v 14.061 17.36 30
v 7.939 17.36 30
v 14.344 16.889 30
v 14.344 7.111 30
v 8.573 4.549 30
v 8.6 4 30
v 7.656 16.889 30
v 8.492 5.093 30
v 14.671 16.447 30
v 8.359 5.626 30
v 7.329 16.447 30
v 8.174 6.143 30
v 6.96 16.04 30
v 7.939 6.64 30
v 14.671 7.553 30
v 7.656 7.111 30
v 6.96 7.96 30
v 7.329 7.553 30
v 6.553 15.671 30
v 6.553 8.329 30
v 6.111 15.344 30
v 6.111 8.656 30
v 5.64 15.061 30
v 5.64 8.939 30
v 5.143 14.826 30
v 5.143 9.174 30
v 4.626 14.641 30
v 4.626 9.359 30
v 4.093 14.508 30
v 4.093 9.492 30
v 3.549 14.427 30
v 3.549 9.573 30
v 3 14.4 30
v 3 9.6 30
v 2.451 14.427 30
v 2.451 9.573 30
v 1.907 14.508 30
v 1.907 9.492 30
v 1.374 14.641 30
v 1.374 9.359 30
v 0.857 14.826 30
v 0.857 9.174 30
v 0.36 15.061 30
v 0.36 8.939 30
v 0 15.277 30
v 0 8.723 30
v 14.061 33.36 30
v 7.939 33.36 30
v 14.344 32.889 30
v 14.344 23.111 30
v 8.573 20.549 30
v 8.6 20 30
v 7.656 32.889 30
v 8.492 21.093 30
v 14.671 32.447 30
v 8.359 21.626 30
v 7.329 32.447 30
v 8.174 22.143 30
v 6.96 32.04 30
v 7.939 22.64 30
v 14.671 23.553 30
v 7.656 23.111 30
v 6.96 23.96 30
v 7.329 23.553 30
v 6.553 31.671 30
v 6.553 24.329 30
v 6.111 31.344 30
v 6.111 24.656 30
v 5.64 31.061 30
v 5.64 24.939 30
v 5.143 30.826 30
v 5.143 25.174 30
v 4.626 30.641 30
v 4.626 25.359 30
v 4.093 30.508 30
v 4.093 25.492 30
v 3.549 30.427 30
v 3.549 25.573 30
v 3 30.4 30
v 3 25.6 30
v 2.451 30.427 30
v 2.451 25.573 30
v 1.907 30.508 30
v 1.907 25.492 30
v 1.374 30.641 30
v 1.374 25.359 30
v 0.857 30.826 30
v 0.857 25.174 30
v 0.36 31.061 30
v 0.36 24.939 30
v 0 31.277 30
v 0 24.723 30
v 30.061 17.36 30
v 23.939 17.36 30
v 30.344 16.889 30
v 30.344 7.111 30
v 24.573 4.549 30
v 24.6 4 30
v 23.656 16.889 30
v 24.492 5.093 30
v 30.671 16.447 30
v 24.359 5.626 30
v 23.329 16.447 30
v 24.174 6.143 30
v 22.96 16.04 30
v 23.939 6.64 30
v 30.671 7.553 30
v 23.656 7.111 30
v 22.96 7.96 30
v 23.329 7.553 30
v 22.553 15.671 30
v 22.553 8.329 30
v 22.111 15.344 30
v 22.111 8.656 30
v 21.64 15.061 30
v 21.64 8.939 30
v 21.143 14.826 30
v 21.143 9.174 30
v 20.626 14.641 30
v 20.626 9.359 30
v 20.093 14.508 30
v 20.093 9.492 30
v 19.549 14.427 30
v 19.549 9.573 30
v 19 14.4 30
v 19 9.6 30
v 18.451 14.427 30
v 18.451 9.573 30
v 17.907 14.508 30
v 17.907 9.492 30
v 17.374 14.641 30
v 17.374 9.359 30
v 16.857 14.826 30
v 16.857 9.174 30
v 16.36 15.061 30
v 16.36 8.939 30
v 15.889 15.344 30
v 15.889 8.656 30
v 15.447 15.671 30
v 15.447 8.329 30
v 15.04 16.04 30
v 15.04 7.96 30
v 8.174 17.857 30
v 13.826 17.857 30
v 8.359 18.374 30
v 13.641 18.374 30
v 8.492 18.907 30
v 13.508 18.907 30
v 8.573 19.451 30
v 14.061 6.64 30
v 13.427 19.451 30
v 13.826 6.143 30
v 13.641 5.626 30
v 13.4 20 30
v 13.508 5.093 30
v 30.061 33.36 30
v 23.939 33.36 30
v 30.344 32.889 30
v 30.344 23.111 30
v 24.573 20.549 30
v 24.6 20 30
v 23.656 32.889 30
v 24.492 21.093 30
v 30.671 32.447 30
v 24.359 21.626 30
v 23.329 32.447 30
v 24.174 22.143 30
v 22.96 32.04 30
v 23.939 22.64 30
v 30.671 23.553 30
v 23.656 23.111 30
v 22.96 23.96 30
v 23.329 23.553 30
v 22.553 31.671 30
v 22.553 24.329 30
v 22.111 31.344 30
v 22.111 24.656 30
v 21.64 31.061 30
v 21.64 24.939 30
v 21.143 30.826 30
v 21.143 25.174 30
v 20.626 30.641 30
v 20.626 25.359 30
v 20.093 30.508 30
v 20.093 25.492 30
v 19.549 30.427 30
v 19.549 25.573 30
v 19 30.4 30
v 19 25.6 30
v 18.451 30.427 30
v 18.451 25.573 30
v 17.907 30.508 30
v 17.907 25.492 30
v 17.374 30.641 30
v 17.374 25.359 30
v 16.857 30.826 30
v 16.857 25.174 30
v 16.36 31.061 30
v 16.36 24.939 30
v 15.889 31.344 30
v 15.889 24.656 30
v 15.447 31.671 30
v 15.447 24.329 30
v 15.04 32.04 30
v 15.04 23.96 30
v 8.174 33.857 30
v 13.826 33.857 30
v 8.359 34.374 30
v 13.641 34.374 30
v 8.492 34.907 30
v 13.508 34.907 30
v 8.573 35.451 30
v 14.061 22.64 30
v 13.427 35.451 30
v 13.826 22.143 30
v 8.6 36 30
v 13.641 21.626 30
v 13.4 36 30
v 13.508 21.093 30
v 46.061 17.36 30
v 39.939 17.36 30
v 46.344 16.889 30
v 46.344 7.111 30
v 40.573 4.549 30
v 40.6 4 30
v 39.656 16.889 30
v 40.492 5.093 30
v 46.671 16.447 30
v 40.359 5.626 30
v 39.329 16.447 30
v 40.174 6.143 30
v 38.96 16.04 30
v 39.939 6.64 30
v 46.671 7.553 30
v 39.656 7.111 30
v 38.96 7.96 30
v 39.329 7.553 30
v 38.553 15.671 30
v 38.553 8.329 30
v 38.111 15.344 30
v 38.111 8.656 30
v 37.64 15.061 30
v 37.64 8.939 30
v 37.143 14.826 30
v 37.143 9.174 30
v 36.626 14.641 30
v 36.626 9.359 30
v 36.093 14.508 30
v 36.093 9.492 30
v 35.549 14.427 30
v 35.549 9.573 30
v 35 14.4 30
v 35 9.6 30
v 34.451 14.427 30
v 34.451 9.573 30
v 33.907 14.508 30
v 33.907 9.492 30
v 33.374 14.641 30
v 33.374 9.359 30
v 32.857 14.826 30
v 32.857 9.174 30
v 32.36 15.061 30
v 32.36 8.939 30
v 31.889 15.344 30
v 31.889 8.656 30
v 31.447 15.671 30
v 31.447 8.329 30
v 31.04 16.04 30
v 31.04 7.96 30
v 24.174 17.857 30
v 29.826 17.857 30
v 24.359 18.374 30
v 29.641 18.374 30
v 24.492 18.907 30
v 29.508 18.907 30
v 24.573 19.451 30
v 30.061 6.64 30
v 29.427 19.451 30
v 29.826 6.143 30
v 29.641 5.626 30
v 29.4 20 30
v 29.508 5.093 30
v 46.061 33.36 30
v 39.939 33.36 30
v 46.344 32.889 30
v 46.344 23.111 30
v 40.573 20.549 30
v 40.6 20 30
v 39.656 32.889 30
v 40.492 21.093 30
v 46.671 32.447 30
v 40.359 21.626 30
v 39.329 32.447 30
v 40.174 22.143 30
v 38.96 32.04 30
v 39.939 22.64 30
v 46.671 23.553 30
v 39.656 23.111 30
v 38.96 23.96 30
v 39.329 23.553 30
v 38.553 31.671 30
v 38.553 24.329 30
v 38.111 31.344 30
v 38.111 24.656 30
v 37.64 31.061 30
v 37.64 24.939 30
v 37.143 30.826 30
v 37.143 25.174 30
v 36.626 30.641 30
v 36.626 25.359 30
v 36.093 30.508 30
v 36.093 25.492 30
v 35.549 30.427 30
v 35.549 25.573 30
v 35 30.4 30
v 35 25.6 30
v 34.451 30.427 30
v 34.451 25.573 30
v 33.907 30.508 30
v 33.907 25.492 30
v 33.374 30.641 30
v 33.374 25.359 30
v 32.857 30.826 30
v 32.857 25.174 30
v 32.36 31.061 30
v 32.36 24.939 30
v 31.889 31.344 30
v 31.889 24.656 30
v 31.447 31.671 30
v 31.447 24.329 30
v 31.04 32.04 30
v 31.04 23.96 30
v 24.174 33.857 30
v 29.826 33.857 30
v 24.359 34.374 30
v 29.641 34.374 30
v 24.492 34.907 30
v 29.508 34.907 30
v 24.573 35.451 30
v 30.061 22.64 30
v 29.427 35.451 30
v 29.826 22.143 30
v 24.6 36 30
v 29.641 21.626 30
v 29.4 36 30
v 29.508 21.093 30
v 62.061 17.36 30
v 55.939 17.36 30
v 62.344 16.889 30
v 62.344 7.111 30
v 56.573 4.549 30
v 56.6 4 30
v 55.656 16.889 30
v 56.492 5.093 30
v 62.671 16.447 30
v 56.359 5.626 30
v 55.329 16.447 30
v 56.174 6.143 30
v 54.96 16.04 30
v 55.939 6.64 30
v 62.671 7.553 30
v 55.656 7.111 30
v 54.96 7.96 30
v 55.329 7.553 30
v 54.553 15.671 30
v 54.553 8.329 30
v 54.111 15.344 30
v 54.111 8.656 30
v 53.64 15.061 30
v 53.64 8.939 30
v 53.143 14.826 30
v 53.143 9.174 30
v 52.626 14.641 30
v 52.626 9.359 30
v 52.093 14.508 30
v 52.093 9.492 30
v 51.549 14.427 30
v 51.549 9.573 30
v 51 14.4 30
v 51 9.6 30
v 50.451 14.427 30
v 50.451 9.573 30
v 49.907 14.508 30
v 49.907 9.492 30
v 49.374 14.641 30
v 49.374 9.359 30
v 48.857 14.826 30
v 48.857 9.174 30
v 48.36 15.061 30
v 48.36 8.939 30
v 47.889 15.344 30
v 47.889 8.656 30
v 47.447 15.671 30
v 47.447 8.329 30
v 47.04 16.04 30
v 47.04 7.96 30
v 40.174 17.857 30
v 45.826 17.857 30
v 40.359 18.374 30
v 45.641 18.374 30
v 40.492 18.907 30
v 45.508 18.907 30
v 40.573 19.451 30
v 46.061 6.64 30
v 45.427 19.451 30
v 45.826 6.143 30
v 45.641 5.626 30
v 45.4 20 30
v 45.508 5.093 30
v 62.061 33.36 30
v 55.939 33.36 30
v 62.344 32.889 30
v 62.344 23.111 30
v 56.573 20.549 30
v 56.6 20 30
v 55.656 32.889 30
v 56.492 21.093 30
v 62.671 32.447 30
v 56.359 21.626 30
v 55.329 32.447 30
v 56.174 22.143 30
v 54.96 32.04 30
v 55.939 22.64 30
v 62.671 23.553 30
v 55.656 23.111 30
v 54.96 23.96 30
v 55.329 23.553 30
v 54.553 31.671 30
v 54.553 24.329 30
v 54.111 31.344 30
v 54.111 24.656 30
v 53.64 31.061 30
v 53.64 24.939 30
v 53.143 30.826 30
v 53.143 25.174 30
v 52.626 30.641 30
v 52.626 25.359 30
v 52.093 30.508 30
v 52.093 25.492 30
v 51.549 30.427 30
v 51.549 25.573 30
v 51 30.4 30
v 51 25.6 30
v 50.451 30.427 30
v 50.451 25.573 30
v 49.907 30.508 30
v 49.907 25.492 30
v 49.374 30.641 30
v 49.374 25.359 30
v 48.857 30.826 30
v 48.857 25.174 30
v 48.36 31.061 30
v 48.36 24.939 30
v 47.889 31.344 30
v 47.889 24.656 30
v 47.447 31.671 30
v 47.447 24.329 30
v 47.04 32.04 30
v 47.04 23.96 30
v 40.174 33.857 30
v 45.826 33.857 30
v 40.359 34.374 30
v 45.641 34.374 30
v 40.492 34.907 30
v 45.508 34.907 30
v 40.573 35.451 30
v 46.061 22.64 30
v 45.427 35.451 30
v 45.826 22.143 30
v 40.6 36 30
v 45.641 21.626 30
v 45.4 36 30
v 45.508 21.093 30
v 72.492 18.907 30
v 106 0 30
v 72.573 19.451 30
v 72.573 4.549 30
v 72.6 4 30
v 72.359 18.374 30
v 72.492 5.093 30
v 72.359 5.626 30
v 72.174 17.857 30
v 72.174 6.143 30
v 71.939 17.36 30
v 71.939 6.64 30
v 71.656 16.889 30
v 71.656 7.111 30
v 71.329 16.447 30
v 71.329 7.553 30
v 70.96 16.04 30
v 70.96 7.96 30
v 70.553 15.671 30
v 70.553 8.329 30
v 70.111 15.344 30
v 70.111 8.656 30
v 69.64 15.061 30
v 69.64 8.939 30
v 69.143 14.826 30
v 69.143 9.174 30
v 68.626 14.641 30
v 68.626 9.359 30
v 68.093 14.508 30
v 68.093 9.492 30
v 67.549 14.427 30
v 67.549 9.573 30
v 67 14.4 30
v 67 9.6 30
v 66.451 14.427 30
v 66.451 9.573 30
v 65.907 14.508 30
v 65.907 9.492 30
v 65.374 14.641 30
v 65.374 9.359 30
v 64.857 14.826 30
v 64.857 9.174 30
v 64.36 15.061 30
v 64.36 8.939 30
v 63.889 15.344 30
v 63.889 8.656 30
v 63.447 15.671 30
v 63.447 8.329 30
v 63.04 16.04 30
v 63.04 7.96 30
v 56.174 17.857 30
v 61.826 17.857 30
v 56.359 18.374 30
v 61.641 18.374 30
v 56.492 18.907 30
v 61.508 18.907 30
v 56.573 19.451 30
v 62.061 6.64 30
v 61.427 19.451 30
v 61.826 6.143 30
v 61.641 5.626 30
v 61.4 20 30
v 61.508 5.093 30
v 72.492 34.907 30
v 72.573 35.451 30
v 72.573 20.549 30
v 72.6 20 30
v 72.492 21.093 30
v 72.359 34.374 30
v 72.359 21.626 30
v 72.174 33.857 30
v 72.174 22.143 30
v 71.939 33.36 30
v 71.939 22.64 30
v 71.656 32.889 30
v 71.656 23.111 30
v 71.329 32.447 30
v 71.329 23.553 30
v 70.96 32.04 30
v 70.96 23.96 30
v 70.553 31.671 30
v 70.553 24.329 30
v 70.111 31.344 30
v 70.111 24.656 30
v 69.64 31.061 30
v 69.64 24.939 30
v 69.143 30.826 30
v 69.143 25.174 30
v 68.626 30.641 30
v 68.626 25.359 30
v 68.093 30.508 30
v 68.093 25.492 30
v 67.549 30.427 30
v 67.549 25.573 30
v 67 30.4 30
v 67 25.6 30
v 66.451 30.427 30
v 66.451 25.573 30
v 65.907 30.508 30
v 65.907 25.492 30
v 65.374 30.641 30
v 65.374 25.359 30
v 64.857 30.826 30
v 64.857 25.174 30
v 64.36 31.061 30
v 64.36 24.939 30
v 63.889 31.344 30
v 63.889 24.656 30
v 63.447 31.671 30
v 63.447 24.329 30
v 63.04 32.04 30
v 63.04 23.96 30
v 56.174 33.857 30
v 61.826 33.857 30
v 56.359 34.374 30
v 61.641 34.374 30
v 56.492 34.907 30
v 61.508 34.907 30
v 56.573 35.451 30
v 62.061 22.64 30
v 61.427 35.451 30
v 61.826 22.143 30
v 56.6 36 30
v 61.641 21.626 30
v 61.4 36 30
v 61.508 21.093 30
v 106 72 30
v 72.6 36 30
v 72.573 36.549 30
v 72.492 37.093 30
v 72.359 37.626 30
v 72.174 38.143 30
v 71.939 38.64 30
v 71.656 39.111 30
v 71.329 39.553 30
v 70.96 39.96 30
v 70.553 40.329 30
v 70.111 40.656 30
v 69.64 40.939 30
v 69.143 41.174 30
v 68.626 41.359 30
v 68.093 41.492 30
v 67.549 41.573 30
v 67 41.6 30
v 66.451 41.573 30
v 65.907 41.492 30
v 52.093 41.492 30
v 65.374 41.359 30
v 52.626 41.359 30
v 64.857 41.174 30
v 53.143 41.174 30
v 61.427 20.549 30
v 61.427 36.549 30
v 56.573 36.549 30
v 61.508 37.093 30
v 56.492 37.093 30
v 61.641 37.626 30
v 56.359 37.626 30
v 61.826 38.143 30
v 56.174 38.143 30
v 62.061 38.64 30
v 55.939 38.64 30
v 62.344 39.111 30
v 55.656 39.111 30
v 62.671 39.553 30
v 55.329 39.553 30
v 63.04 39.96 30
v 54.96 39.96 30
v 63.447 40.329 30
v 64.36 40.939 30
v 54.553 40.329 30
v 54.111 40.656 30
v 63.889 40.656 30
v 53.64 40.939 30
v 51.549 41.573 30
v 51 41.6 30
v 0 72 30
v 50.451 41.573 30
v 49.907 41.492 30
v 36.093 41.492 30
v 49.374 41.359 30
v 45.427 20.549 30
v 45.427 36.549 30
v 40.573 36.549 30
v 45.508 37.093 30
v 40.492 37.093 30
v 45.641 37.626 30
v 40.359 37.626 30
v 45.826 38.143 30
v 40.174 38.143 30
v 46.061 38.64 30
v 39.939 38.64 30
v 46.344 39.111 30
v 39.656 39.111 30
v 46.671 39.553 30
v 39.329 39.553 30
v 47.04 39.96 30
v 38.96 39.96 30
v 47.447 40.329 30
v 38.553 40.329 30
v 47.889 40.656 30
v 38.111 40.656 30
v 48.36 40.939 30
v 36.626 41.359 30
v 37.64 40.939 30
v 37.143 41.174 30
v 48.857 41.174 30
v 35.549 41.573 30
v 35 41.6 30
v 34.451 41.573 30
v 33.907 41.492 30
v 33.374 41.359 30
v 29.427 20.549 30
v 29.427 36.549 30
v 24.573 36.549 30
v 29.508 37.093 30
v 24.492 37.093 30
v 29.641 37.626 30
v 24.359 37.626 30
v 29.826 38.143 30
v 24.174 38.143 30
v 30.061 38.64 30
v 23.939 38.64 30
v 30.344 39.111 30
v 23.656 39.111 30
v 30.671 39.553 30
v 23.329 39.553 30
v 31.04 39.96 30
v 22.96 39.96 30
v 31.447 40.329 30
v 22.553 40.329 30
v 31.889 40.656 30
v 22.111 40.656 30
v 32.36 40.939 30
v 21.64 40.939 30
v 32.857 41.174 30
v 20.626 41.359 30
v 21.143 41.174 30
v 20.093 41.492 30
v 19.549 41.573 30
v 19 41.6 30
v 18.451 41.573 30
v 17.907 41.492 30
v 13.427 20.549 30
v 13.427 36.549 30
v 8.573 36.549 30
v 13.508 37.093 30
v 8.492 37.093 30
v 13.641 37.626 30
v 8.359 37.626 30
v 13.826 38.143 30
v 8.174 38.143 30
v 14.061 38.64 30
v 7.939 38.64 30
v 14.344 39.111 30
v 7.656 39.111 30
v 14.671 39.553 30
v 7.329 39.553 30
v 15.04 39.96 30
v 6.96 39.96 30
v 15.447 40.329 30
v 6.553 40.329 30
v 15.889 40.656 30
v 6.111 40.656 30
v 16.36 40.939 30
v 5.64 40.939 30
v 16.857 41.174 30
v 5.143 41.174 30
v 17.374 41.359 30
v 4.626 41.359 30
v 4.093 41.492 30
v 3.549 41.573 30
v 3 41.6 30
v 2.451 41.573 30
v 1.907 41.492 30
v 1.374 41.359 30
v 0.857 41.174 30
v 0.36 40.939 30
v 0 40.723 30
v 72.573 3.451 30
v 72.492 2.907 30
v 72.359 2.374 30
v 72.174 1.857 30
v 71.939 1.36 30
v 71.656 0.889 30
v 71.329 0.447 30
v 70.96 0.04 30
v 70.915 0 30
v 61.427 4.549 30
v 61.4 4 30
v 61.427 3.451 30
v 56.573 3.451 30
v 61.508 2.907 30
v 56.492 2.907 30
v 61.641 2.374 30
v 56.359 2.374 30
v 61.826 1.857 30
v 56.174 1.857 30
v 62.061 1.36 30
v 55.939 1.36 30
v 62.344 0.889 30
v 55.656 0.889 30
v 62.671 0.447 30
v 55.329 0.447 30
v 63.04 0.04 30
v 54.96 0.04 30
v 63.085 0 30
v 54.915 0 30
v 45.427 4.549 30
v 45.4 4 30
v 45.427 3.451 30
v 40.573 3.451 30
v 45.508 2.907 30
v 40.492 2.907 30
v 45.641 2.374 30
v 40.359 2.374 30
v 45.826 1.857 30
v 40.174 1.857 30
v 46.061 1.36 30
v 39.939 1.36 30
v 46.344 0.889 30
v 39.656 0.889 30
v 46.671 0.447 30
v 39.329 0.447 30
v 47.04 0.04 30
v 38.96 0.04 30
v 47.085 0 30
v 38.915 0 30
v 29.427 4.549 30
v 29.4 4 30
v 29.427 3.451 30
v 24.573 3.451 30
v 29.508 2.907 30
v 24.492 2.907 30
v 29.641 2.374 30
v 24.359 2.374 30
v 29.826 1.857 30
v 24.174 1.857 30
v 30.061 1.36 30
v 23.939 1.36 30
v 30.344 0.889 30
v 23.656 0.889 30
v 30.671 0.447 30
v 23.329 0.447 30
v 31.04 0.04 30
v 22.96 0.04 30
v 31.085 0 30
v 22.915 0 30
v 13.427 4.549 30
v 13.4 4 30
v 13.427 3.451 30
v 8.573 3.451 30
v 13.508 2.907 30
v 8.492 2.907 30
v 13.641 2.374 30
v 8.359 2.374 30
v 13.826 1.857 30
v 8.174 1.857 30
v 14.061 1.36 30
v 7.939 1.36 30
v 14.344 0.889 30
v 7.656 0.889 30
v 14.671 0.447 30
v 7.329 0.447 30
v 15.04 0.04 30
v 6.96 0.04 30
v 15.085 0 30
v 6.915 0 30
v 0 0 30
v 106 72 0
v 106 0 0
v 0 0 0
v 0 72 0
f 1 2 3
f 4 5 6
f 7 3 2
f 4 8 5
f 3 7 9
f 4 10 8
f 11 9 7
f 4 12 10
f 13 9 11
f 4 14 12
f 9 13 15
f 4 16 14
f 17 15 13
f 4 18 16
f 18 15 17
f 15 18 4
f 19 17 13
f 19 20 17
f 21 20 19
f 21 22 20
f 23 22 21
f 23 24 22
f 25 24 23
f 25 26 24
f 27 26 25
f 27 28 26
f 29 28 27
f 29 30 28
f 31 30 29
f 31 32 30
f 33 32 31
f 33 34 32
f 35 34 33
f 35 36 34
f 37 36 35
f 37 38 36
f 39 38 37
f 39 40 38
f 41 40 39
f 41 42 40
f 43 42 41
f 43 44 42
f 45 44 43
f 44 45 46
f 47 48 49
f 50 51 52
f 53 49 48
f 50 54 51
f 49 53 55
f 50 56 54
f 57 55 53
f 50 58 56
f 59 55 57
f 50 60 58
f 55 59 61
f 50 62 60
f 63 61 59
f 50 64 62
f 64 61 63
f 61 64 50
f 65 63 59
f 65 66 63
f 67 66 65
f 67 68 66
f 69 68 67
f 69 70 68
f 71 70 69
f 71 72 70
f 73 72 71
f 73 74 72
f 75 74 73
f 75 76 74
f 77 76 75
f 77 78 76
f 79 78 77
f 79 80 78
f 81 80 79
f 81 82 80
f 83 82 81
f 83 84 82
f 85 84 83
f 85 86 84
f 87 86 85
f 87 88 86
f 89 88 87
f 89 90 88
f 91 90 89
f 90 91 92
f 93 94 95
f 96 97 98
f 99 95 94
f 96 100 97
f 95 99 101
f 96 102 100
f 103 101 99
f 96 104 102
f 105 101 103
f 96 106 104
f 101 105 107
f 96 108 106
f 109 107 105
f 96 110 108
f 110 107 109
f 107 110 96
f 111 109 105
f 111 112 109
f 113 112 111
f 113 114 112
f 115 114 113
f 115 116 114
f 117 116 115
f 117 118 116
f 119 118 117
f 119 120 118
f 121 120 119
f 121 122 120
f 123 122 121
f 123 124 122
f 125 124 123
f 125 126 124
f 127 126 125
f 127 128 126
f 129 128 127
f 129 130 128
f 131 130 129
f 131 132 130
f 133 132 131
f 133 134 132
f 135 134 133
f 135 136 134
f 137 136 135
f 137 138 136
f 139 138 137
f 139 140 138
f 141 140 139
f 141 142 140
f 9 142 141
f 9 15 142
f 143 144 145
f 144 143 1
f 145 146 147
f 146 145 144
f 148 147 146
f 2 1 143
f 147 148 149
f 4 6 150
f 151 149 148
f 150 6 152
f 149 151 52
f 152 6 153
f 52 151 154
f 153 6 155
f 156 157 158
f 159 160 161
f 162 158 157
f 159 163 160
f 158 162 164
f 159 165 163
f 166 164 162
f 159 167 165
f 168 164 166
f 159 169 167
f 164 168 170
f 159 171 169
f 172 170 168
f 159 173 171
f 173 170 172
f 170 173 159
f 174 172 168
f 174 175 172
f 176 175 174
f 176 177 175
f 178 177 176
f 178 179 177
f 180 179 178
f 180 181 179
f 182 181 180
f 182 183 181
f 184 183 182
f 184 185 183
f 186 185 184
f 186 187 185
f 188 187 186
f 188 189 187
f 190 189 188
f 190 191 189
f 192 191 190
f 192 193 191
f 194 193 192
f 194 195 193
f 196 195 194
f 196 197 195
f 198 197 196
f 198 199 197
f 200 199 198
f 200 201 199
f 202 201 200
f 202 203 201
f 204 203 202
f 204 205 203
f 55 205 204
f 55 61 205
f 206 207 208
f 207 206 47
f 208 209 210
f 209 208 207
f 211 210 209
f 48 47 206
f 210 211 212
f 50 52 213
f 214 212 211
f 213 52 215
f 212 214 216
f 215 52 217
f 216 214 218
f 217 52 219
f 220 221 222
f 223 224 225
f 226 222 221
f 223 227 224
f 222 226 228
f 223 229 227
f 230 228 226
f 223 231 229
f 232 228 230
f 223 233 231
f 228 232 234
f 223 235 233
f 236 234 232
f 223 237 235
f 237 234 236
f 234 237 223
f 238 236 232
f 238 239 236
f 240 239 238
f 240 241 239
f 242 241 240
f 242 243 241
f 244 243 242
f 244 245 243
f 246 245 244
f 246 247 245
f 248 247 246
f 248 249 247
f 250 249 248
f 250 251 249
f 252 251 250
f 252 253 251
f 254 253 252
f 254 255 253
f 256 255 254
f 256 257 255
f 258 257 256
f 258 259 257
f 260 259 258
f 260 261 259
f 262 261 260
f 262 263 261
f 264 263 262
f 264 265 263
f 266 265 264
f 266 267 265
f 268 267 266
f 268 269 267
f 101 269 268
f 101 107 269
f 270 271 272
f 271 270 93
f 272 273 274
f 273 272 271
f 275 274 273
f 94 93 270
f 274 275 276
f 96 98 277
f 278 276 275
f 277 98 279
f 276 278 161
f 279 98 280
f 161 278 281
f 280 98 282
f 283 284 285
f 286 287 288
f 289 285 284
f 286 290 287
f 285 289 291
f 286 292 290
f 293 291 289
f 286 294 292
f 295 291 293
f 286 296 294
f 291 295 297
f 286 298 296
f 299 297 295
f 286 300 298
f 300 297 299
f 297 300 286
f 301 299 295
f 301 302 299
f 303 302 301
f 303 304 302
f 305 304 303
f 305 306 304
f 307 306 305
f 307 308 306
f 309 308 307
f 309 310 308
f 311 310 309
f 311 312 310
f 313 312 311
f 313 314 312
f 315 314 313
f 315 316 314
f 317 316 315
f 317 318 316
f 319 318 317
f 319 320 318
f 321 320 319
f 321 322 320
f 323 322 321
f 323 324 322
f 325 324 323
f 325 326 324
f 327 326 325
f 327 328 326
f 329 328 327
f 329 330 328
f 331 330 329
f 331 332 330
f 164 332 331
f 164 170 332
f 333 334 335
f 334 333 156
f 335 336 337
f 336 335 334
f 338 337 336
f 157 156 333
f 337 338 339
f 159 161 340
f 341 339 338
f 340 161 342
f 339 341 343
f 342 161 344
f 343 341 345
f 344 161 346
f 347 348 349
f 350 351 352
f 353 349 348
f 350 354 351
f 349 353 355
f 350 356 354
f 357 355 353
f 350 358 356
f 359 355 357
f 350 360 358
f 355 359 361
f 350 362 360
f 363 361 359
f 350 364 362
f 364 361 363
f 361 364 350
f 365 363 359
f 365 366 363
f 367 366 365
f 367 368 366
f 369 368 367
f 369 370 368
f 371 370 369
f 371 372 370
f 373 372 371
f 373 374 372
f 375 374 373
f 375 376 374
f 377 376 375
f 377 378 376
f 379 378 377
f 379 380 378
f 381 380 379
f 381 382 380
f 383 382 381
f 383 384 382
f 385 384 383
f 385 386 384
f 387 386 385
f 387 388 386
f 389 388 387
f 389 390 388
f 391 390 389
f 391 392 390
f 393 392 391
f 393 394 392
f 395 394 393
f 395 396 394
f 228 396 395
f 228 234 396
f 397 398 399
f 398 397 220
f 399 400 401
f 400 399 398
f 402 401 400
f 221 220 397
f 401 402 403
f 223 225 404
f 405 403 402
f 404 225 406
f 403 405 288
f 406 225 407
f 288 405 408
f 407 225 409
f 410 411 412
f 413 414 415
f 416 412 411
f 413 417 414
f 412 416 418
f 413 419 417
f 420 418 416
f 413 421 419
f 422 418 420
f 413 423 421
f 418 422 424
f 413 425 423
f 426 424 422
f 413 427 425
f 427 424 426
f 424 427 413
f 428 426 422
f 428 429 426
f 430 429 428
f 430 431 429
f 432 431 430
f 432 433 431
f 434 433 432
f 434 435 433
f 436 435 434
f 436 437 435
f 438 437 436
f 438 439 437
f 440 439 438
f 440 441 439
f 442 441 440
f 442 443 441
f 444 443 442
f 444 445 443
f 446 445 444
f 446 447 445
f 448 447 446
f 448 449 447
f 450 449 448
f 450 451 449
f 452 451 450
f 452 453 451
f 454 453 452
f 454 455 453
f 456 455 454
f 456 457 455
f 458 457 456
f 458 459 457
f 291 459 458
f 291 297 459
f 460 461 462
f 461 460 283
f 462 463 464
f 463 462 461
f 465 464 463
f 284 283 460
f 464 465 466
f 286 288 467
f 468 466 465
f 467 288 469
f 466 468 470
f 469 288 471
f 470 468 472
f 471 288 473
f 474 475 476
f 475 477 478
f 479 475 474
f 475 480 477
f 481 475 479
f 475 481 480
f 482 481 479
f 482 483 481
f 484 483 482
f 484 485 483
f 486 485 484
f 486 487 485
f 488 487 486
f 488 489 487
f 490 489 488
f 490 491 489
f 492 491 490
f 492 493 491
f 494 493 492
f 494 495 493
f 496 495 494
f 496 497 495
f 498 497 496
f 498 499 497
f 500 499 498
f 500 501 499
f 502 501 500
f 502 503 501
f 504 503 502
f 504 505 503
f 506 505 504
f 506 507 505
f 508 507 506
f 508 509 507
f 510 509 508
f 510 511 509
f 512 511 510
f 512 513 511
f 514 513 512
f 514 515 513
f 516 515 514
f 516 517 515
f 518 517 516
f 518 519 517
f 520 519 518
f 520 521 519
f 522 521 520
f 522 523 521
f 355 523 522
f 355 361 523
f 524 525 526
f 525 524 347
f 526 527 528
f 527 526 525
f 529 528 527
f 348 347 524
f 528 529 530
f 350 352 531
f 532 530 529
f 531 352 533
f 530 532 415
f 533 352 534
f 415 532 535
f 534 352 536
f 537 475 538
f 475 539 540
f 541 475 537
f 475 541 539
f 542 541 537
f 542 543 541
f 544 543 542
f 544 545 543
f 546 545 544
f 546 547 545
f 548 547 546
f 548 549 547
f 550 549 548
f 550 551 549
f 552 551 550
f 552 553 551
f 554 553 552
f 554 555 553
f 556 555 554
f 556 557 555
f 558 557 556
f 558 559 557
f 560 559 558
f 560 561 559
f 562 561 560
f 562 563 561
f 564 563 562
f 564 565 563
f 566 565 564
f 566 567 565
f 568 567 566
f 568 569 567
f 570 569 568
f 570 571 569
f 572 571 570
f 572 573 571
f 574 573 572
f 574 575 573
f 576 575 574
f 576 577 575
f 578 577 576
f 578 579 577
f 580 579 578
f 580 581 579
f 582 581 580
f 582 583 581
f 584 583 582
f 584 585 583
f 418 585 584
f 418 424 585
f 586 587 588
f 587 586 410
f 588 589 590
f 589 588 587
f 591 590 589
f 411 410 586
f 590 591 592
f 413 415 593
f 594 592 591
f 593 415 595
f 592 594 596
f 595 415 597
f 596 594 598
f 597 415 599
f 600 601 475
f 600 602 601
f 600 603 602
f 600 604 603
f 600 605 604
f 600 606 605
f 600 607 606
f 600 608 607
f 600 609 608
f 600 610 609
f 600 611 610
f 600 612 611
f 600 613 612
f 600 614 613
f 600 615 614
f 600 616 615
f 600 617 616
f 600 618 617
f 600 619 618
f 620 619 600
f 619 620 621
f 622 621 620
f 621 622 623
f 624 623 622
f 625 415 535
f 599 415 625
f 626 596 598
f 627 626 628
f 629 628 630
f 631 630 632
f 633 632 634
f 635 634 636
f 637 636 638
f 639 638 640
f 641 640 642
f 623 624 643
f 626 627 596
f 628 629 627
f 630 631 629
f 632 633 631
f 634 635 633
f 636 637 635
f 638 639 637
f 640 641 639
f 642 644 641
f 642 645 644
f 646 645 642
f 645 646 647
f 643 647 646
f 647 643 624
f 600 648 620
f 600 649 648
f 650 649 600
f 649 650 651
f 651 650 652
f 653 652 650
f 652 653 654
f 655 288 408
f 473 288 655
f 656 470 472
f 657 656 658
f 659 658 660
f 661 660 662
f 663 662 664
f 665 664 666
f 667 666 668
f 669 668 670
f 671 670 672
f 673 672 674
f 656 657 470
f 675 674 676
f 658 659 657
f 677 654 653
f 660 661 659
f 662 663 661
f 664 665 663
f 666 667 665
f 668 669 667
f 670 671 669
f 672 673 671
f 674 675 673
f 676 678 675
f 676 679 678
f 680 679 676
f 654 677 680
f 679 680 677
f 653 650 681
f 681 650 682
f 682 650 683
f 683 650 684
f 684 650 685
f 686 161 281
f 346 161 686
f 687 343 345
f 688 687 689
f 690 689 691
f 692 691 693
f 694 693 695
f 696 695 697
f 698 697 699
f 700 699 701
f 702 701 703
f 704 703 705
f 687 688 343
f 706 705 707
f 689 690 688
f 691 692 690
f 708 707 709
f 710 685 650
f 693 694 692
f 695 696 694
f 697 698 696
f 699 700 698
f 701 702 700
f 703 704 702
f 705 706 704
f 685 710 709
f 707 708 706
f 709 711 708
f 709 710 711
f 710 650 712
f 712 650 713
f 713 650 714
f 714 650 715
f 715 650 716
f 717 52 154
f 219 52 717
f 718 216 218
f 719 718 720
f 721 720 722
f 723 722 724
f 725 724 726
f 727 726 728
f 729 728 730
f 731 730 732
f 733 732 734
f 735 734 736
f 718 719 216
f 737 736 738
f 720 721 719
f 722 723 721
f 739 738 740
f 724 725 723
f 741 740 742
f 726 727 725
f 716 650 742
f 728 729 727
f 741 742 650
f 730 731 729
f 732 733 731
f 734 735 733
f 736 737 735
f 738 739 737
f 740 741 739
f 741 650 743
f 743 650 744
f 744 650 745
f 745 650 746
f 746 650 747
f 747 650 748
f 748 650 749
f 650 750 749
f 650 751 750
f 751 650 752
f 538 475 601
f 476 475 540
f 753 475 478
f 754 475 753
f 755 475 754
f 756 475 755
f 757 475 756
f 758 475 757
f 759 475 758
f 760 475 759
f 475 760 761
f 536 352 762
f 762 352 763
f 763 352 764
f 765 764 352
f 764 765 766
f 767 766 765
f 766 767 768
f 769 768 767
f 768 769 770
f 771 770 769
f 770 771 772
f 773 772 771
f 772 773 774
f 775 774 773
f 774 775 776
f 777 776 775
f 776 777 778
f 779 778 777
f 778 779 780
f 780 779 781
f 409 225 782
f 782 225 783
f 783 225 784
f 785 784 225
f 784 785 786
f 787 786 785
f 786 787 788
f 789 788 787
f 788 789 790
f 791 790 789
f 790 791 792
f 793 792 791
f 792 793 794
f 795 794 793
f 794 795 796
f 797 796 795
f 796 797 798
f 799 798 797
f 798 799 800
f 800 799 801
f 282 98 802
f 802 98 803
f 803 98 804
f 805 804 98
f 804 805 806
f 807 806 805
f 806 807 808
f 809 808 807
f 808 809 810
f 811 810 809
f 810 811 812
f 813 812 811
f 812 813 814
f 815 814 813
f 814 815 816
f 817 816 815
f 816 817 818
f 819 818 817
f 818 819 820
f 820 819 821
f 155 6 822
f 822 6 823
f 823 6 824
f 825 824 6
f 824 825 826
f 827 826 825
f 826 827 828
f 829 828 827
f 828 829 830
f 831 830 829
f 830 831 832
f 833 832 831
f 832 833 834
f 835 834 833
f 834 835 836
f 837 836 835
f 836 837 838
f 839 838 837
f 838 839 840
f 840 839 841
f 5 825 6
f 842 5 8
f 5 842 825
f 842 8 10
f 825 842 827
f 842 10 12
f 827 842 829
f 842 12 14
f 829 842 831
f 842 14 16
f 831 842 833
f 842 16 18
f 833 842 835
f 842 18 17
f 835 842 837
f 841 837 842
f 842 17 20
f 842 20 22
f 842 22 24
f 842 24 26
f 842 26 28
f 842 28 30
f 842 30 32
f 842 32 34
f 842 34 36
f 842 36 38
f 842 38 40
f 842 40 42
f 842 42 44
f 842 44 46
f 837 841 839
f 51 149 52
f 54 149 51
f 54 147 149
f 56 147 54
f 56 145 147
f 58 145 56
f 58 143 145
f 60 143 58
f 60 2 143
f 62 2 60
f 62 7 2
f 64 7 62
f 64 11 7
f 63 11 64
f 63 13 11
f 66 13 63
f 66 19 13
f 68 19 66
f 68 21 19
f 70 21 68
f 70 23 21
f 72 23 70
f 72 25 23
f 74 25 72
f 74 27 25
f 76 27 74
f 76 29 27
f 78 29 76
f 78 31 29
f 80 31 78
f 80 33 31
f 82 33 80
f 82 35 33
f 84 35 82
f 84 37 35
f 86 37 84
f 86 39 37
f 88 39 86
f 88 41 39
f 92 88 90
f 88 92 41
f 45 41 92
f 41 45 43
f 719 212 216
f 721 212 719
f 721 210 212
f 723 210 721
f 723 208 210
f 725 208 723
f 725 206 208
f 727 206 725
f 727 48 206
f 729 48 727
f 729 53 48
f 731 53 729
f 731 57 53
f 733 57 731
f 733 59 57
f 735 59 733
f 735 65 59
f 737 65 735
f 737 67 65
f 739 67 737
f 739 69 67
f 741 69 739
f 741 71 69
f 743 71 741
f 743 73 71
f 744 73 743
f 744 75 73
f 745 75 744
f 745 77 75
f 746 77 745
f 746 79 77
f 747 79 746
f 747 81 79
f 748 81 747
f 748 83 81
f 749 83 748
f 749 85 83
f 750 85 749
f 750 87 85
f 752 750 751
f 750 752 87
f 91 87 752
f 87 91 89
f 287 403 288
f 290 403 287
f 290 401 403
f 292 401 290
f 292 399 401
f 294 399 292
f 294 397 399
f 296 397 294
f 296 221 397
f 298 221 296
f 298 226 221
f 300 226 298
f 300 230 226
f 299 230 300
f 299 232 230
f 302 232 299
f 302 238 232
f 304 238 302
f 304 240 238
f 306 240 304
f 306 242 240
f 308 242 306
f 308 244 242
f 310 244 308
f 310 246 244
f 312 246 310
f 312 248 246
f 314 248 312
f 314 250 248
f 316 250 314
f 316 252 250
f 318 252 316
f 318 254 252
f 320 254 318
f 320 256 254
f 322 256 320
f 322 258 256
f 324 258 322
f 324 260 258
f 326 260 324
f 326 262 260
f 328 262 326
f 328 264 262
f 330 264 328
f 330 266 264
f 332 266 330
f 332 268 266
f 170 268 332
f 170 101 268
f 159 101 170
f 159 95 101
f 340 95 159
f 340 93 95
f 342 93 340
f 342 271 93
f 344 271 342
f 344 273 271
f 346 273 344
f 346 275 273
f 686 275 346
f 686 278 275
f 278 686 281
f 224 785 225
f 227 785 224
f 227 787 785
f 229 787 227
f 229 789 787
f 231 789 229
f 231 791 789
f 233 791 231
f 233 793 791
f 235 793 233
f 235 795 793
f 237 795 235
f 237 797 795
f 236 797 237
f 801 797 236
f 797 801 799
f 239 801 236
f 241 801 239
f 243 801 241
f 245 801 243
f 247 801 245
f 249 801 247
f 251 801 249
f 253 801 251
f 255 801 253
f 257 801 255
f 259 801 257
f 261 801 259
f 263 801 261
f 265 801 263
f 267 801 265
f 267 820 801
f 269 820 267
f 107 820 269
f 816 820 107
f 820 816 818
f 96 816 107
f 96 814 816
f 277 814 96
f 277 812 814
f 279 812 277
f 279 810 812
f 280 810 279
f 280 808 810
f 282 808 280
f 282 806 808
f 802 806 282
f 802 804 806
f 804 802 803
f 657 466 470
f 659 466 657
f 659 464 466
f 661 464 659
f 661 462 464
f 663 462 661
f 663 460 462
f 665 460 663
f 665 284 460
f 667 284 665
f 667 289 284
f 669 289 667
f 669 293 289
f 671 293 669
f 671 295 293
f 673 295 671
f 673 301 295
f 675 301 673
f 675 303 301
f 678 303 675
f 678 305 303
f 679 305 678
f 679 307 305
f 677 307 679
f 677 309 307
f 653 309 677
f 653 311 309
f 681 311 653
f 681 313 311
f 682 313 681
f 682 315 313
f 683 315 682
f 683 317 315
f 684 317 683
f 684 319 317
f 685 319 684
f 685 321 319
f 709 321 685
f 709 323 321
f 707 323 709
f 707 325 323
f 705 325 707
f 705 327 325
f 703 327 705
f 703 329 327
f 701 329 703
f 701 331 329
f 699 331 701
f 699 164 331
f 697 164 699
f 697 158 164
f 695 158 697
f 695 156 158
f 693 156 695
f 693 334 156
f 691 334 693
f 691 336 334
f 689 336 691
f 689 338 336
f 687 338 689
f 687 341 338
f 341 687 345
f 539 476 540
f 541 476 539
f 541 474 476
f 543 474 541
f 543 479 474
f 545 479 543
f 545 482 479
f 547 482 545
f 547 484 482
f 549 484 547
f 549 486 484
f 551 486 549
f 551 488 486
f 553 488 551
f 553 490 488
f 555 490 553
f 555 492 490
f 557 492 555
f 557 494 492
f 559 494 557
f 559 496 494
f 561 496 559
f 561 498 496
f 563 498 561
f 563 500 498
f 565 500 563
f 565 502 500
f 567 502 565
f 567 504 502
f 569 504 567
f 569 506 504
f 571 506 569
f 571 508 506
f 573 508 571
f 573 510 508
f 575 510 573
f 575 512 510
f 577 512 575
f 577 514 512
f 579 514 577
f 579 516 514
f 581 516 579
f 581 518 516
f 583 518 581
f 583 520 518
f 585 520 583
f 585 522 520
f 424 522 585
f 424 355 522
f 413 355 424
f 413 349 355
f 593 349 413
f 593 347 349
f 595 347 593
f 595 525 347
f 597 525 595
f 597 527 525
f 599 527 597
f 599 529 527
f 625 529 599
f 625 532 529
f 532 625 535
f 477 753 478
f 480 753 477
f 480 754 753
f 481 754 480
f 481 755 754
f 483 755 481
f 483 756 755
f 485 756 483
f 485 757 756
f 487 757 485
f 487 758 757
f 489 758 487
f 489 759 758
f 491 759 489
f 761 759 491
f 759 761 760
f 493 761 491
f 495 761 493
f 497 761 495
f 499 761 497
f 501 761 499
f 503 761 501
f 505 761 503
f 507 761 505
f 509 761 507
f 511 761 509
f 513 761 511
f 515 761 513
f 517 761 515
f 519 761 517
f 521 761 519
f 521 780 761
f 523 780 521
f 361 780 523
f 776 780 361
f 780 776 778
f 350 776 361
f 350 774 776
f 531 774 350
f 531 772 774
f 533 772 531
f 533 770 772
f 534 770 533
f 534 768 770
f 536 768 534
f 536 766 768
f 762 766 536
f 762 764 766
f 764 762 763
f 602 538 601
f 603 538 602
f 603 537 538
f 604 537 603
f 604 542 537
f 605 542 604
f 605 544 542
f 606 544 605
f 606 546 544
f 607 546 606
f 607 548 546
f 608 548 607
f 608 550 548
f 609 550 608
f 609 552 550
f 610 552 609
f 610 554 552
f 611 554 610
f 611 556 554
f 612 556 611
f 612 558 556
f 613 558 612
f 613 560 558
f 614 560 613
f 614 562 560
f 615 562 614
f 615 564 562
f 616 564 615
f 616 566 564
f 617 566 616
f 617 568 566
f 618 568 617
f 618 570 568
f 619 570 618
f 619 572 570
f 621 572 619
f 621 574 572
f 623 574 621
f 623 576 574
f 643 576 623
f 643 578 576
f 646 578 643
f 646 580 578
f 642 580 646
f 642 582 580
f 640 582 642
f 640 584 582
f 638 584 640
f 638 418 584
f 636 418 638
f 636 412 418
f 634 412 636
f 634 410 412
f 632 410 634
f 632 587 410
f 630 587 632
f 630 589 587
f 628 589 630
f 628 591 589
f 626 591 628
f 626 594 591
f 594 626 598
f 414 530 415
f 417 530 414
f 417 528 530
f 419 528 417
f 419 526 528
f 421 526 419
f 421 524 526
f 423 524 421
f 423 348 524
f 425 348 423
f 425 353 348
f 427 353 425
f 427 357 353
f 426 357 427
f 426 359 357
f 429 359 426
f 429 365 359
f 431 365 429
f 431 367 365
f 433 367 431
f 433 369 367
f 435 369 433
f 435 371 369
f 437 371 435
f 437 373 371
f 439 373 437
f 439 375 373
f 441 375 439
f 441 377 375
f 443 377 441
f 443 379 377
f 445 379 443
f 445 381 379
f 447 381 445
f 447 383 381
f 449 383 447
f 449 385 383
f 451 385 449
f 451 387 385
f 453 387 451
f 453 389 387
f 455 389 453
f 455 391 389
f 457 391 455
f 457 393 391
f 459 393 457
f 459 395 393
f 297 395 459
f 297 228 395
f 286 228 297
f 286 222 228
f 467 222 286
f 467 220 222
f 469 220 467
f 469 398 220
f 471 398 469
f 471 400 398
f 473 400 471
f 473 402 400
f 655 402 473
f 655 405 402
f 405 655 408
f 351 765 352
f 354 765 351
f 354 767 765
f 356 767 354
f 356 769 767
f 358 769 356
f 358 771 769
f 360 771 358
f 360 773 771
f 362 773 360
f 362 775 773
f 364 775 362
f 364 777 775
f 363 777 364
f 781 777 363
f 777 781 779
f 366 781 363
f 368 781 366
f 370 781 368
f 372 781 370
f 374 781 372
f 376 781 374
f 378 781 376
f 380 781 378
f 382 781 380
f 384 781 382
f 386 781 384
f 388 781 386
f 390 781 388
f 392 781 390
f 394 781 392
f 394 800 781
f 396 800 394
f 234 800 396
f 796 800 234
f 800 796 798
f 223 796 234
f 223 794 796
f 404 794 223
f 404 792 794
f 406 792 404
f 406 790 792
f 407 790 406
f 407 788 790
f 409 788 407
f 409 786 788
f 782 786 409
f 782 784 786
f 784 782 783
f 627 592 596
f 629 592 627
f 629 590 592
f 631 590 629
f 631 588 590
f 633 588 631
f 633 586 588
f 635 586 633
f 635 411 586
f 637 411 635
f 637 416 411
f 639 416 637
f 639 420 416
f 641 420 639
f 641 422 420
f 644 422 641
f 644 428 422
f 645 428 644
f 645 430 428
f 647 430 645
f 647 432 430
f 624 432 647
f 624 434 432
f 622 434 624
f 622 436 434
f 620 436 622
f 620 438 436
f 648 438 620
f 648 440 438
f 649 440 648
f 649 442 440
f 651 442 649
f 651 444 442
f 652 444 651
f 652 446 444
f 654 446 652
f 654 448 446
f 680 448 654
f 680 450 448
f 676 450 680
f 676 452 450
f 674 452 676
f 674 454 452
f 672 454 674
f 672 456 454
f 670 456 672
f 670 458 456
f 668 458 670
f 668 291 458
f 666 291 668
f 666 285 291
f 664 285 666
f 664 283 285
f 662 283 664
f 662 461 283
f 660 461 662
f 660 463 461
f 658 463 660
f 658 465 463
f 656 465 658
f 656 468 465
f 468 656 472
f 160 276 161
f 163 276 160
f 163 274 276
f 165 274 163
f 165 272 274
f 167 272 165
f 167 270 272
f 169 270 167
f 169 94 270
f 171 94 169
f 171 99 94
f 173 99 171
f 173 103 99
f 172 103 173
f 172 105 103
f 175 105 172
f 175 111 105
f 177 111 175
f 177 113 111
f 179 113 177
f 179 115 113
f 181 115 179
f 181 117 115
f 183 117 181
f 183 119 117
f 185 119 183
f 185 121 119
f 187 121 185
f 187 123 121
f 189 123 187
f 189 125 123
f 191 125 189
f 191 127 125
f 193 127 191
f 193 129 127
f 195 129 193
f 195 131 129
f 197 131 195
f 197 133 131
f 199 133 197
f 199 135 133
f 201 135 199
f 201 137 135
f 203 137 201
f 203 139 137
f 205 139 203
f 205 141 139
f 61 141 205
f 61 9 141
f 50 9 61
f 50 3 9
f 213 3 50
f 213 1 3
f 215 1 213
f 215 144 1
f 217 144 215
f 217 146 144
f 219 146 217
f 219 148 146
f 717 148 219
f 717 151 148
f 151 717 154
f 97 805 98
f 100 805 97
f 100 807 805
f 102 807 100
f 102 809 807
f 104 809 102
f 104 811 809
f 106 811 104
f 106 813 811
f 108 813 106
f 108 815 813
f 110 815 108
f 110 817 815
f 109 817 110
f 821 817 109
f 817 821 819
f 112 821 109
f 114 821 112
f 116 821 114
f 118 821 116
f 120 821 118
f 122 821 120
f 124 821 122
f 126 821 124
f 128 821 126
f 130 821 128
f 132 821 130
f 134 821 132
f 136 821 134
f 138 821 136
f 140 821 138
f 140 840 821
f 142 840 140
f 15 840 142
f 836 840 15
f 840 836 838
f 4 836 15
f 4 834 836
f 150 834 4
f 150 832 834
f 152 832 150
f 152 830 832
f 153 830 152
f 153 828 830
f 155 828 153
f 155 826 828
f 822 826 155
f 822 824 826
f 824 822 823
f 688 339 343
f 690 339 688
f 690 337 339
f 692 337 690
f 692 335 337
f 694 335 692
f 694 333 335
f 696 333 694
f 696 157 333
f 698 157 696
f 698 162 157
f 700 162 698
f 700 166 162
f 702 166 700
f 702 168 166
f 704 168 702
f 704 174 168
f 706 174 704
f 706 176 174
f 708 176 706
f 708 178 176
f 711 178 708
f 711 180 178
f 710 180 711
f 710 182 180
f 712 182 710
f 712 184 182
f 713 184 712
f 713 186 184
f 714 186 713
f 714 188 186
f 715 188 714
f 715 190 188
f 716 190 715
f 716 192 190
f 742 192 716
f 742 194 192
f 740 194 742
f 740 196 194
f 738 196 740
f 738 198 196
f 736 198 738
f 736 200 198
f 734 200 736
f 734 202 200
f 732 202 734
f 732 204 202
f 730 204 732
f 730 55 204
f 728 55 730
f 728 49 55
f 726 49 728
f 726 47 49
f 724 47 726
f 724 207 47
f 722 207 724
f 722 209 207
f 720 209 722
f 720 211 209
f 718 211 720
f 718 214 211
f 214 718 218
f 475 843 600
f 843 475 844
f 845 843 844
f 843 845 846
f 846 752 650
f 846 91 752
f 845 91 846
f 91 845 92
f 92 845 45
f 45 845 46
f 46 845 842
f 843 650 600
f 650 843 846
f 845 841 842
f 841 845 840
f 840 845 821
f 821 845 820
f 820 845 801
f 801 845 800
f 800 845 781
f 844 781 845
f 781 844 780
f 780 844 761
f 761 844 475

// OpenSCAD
// Bench Rack for 1.5 mL Microcentrifuge Tubes
// Designed for FDM printing. Rests on XY plane at Z=0.

// --- Dimensions ---
// Block dimensions
$block_length = 106; // X
$block_width  = 72;  // Y
$block_height = 30;  // Z

// Hole grid configuration
$hole_count_x = 6;   // Holes along X
$hole_count_y = 4;   // Holes along Y
$hole_spacing = 16;  // Centre-to-centre spacing (X and Y)

// Hole dimensions
$hole_diameter = 11.2; // mm
$hole_depth    = 25;   // mm (open top, closed bottom)
$floor_height  = 5;    // mm (solid floor thickness)

// Print settings
$fn = 64; // Smoothness for holes

// --- Main Block ---
difference() {
    // 1. The solid rectangular block
    // Defined from Z=0 to Z=30
    cube([
        $block_length,
        $block_width,
        $block_height
    ]);

    // 2. The holes
    // We subtract cylinders. 
    // To cut a hole 25mm deep starting from the top (Z=30) down to Z=5:
    // The cylinder must start at Z=30 and extend downwards.
    // We add 0.01mm to the height to ensure the cutter extends past the bottom of the hole 
    // to avoid coplanar faces (Rule 5).
    $cut_height = $hole_depth + 0.01; 
    
    for (i = [0 : $hole_count_x - 1]) {
        for (j = [0 : $hole_count_y - 1]) {
            // Calculate position for current hole
            // Grid is centered on the block
            $x_pos = -($block_length / 2) + ($hole_spacing * ($hole_count_x - 1)) / 2 + (i * $hole_spacing);
            $y_pos = -($block_width / 2) + ($hole_spacing * ($hole_count_y - 1)) / 2 + (j * $hole_spacing);
            
            // Cylinder parameters
            $r = $hole_diameter / 2;
            
            // Translate to position. 
            // Top of cylinder is at Z = $block_height (30).
            // Cylinder extends down by $cut_height.
            translate([
                $x_pos,
                $y_pos,
                $block_height
            ]) {
                cylinder(
                    h = $cut_height,
                    r1 = $r,
                    r2 = $r,
                    $fn = $fn
                );
            }
        }
    }
}
